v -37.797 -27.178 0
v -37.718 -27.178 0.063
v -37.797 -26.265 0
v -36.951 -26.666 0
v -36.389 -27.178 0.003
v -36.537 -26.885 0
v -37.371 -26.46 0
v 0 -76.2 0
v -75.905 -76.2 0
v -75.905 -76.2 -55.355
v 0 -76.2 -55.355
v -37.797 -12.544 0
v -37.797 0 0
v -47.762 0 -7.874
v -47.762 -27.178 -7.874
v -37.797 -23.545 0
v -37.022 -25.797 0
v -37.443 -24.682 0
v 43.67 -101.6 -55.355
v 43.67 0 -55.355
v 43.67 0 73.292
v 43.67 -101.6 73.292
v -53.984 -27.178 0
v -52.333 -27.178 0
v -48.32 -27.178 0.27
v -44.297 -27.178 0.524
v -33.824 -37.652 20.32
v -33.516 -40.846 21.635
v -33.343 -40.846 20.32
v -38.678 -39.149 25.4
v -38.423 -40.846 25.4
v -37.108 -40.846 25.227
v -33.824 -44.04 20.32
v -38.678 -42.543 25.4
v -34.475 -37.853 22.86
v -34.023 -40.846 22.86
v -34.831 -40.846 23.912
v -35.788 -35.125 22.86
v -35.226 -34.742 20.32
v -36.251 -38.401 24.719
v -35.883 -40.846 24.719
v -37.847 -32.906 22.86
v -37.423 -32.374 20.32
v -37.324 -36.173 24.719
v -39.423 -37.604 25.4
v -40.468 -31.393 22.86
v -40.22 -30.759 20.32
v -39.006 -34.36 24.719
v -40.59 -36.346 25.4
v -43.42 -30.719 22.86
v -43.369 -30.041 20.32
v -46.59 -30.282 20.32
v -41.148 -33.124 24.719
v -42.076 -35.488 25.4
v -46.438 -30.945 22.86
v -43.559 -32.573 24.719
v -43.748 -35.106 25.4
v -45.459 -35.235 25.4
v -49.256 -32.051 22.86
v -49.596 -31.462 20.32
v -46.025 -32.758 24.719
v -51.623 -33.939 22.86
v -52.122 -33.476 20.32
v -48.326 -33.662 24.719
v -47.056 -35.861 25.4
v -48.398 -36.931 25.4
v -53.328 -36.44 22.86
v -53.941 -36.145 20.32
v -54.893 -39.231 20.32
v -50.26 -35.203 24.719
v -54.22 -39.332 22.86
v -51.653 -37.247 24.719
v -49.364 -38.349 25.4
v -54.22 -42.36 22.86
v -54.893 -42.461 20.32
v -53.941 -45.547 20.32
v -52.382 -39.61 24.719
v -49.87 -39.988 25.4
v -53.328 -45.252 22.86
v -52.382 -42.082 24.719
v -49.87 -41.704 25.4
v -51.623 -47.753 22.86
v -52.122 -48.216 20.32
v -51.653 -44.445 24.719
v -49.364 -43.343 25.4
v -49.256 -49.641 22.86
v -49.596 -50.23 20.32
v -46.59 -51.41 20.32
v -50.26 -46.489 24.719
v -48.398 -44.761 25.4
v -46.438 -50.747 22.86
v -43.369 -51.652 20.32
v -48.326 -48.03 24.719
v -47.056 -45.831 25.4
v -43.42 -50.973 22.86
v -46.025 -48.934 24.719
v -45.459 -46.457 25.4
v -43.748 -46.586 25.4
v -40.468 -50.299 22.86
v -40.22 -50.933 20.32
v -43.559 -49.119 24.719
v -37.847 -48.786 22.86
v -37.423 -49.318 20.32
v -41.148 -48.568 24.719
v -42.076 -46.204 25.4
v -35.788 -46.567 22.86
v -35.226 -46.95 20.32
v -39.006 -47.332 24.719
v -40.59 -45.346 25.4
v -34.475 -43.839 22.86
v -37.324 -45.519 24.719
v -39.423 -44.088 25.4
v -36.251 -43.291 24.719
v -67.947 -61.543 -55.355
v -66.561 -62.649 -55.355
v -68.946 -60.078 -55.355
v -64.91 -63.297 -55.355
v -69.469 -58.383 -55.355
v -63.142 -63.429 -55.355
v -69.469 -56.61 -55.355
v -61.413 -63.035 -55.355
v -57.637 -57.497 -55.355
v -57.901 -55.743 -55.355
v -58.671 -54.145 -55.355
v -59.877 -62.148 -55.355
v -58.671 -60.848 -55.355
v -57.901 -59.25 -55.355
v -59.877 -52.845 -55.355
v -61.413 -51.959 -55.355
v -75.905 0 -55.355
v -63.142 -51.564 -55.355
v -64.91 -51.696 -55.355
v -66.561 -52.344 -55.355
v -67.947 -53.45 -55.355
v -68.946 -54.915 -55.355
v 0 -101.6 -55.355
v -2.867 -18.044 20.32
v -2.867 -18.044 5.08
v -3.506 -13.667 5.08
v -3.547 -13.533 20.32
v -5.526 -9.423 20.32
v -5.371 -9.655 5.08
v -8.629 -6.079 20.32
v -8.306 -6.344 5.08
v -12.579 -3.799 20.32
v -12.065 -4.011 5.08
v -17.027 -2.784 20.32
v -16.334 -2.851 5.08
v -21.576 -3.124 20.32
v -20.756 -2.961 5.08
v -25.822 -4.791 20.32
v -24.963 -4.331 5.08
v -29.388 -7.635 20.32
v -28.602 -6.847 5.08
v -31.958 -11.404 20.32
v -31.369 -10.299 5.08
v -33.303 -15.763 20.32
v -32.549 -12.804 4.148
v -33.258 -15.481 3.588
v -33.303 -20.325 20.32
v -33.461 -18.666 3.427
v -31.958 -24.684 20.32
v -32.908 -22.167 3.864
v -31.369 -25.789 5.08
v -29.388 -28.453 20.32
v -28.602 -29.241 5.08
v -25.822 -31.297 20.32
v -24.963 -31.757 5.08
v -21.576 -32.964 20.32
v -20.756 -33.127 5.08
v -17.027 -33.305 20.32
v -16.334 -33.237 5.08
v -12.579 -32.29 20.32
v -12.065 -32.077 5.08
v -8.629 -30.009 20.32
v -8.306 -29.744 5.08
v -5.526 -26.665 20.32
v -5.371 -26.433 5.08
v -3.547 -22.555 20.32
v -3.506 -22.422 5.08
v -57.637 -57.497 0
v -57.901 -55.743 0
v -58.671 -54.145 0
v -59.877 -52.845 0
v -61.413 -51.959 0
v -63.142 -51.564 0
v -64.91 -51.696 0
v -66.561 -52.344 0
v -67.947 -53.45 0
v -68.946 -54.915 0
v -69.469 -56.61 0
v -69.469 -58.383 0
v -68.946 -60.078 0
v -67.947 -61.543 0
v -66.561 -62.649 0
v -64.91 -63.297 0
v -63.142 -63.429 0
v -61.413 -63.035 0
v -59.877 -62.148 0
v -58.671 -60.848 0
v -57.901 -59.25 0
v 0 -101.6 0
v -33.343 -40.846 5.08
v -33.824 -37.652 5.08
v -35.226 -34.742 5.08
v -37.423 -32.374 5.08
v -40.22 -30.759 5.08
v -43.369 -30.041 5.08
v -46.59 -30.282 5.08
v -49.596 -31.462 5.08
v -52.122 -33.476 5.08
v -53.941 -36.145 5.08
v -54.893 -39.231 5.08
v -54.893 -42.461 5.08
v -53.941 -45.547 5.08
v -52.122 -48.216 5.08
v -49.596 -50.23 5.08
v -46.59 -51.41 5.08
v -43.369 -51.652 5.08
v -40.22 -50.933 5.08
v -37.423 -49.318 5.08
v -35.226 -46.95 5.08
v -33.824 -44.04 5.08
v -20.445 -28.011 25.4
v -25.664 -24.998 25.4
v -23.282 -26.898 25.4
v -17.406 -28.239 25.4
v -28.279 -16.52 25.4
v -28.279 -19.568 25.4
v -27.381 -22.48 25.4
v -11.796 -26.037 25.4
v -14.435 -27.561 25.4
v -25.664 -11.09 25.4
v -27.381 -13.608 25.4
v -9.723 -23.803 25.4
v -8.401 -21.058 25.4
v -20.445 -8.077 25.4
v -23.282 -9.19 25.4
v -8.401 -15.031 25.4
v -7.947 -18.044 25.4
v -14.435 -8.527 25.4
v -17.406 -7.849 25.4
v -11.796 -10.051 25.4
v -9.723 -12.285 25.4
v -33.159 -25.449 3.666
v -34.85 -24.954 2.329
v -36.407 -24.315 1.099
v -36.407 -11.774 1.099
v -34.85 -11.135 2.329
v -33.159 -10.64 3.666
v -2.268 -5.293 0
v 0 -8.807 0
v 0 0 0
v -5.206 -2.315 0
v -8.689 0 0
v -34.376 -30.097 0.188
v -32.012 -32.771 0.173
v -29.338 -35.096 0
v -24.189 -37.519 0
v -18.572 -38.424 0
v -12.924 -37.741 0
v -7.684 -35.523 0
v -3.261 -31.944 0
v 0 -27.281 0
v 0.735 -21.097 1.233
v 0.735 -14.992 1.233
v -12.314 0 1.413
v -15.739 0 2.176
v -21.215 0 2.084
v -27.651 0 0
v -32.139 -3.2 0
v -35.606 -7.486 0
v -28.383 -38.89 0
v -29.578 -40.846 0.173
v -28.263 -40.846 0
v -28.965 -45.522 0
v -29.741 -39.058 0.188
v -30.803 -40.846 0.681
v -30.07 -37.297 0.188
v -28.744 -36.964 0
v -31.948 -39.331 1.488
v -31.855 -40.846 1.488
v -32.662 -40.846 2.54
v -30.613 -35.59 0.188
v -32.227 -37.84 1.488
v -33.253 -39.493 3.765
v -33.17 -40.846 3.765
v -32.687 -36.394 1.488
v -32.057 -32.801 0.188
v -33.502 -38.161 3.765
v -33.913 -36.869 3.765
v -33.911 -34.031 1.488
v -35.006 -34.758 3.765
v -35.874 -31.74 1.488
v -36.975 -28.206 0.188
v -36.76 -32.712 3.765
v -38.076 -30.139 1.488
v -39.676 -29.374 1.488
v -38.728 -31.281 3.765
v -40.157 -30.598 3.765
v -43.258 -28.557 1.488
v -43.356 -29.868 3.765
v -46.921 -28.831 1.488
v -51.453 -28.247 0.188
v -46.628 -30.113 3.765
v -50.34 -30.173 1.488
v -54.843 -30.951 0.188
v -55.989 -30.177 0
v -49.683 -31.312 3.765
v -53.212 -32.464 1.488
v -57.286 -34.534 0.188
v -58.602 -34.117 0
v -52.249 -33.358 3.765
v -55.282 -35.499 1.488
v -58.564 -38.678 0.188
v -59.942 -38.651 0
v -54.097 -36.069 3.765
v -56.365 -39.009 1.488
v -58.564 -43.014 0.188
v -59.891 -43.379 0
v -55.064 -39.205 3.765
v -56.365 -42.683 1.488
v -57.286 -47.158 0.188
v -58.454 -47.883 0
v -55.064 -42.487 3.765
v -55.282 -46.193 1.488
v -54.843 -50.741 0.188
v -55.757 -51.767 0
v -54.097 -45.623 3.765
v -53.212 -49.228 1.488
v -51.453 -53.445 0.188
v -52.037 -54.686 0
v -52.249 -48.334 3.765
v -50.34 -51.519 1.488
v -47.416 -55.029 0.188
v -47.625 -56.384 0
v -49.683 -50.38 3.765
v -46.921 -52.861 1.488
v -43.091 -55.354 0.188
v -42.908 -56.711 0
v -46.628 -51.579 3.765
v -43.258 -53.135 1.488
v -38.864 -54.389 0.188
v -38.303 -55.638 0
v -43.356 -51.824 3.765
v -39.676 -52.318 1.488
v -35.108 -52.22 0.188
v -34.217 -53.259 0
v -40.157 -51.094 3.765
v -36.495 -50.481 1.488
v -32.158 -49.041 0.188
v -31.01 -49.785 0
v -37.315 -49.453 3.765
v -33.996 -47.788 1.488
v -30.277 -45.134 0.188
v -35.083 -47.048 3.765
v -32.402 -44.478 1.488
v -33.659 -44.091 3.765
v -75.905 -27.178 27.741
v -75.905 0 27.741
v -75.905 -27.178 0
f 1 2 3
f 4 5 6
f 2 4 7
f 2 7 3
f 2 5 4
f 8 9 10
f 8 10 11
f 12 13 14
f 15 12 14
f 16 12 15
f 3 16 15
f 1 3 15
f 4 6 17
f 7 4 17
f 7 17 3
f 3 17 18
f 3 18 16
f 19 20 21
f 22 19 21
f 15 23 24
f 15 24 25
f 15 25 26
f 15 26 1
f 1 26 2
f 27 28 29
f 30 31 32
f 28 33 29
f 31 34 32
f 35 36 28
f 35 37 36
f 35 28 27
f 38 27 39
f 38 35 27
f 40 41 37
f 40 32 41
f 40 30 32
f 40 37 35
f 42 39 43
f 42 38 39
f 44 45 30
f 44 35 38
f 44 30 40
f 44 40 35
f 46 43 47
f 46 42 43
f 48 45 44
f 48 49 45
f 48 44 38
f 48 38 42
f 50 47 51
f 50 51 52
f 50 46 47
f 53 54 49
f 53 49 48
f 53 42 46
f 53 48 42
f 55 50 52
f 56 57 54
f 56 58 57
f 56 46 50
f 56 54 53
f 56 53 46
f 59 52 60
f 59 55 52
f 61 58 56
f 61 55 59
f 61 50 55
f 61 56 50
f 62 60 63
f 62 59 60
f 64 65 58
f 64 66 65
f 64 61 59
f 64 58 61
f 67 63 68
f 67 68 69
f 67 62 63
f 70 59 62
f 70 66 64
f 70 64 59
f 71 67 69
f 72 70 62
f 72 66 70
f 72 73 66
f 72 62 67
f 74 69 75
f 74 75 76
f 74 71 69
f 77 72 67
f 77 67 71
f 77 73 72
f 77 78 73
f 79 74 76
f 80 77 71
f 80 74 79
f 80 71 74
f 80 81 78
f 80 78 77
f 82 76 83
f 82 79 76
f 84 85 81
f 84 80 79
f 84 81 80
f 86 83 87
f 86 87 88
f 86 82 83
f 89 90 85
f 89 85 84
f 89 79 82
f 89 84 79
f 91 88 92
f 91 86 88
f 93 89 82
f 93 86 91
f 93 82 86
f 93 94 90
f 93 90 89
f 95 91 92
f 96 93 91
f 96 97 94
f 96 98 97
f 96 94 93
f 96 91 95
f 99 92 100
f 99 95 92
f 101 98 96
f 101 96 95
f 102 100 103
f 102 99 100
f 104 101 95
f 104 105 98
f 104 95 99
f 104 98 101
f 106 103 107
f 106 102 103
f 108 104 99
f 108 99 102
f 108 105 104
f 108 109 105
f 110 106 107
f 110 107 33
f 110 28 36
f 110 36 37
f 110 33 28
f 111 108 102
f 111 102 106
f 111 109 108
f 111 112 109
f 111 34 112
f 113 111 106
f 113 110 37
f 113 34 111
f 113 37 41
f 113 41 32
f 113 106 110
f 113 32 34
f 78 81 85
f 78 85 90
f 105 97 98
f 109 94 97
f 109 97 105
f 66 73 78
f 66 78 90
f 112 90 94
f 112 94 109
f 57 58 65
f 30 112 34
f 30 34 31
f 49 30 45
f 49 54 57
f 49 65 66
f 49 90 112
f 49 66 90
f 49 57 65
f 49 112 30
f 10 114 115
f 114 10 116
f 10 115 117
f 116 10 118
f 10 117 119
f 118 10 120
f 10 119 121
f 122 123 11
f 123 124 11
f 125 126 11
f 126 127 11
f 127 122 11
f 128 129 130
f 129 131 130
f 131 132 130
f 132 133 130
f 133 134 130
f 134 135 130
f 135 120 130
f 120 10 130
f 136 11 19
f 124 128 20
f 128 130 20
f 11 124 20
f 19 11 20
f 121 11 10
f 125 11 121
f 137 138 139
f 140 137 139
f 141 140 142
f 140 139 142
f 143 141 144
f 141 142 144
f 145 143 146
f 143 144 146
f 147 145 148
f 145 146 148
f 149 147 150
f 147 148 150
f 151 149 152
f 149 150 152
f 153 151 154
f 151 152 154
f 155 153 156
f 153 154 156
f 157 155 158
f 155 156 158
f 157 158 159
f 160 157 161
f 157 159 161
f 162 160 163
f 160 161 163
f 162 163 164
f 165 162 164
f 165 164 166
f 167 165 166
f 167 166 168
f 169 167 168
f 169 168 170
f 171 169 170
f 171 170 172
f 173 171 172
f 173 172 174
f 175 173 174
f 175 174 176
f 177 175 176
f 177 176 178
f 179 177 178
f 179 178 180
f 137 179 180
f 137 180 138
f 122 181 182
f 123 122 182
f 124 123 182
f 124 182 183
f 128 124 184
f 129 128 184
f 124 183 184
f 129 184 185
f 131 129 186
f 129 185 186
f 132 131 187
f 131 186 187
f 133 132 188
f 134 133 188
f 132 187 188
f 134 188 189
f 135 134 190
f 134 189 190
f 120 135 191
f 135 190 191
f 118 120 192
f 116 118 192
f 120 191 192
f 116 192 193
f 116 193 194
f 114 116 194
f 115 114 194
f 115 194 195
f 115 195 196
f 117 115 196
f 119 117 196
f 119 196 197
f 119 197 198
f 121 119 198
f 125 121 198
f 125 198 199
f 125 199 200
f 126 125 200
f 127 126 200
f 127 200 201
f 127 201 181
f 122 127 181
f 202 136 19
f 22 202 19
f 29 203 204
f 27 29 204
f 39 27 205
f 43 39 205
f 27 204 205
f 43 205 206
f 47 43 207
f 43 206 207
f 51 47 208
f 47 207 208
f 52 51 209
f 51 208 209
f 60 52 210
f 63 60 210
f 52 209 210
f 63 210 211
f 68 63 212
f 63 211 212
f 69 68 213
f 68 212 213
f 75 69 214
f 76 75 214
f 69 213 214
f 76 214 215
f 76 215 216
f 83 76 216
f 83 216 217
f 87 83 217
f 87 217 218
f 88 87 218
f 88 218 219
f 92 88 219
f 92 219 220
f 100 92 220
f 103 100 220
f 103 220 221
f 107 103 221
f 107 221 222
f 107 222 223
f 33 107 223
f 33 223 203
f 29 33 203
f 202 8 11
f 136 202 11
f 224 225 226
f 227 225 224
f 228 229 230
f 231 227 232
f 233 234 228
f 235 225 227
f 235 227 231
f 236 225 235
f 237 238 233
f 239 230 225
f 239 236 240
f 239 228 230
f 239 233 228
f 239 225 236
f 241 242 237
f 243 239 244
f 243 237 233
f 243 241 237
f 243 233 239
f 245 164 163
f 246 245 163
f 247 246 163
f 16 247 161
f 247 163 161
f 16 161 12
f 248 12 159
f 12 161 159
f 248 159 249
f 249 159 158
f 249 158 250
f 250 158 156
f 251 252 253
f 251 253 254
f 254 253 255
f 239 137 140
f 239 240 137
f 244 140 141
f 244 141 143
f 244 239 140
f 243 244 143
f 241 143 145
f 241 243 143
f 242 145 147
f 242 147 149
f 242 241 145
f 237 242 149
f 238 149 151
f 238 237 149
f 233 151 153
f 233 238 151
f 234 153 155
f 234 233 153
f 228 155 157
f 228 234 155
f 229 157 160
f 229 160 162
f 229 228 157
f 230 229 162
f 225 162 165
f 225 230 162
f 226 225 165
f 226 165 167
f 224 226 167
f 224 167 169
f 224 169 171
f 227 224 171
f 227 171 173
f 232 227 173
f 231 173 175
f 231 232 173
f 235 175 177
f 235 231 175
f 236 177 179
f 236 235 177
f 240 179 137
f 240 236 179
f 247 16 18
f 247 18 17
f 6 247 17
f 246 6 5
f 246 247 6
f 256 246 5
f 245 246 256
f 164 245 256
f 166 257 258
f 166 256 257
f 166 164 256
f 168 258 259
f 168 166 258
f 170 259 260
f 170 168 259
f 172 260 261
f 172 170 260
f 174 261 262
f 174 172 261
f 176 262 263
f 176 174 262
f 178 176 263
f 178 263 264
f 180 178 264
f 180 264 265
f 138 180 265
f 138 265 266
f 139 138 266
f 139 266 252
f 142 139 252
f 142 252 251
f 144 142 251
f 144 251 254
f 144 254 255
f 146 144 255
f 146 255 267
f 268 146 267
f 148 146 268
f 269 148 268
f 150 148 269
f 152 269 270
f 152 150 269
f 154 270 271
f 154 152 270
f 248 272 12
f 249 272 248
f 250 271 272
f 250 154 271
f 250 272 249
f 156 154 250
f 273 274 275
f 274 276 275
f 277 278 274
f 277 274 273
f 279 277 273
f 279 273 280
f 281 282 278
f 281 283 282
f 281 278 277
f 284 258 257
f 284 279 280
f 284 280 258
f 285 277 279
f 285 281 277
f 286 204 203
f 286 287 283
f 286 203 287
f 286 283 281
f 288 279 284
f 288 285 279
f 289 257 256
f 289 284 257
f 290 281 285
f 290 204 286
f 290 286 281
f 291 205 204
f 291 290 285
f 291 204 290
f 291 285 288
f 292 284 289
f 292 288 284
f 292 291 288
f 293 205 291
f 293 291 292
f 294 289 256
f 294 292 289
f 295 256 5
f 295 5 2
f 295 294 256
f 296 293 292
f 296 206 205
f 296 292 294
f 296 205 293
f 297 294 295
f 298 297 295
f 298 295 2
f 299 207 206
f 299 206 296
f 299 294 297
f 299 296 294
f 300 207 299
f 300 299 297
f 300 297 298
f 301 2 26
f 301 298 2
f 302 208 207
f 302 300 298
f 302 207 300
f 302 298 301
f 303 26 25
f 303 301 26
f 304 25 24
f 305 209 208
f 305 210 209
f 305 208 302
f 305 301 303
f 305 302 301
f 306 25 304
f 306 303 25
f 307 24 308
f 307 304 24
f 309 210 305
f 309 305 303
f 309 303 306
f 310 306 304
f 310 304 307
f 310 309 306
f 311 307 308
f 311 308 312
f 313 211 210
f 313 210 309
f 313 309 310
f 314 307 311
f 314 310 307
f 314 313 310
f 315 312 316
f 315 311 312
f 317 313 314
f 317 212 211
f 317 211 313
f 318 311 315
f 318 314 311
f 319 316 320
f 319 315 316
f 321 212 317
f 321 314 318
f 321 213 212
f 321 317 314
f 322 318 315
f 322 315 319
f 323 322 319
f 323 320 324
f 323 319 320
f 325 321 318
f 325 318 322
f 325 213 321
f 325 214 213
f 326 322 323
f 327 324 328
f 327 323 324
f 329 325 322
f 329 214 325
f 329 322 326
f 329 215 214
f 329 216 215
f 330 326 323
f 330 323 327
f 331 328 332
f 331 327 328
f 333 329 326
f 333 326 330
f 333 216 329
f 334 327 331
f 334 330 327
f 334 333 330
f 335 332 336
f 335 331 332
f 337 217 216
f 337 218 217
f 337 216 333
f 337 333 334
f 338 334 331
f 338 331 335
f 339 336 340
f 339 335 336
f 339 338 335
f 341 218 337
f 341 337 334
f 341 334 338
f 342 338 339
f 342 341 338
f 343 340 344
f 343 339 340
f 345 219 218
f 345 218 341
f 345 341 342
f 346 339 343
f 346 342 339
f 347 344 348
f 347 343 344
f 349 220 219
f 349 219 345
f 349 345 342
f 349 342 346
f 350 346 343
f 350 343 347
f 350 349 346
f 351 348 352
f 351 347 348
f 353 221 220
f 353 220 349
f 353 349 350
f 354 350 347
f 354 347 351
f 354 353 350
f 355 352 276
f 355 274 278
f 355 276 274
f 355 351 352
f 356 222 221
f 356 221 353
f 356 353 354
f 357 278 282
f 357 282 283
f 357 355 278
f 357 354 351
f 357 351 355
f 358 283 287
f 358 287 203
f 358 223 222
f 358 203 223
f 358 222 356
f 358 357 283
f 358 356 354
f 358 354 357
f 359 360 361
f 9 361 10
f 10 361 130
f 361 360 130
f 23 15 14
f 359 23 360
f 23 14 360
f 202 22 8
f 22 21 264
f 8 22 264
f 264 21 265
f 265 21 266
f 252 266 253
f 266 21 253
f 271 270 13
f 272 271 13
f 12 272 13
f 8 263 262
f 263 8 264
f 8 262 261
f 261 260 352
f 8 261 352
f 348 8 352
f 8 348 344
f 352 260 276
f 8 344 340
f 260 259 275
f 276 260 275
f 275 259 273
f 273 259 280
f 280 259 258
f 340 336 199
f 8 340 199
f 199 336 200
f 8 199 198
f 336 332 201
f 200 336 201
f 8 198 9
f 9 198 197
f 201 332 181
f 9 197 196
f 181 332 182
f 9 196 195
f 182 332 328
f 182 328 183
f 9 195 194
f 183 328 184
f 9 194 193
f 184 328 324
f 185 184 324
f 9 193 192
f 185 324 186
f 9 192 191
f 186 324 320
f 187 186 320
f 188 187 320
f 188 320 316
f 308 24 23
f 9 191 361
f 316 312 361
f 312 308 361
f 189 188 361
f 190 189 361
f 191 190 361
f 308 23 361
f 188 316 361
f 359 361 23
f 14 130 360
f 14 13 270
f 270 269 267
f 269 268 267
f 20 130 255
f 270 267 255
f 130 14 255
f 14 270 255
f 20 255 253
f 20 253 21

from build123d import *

# Parameters (mm, degrees)
F1_DEPTH = 76.2
F3_DEPTH = 25.4
F5_DEPTH = 49.022
F6_R     = 15.3034000689
F6_R_2   = 10.835787307
F6_R_3   = 5.9493654503
F7_DEPTH = 25.4
F8_DEPTH = 12.7
F9_DEPTH = 120.396


# Not quite as in the source:
# - a fillet or chamfer that OpenCascade refuses, or shapes differently, is made with other operations: its cross-section is extruded or revolved along the edge and cut away or added


with BuildPart() as f1:
    # F0 (on Front) → F1 (new body)
    with BuildSketch(Plane.XZ):
        Polygon((43.6695814133, 73.2915997505), (0, 0), (-37.7974100411, 0), (-75.9054422379, 48.224221915), (-75.9054422379, -55.3548447788), (43.6695814133, -55.3548447788), align=None)
    extrude(amount=F1_DEPTH)

    # F2 (on face) → F3 (join)
    with BuildSketch(Plane.XZ.offset(76.2)):
        Polygon((43.6695814133, 73.2915997505), (0, 0), (0, -55.3548447788), (43.6695814133, -55.3548447788), align=None)
    extrude(amount=F3_DEPTH)

    # F4 (on face) → F5 (cut)
    with BuildSketch(Plane.XZ.offset(76.2)):
        Polygon((-75.9054422379, 0), (-37.7974100411, 0), (-75.9054422379, 48.224221915), align=None)
    extrude(amount=-F5_DEPTH, mode=Mode.SUBTRACT)

    # F6 (on face) → F7 (join)
    with BuildSketch(Plane.XY):
        with Locations((-18.1702096015, -18.0441774428)):
            Circle(F6_R)
        with Locations((-44.1785492003, -40.8460125327)):
            Circle(F6_R_2)
        with Locations((-63.5862797499, -57.4966222048)):
            Circle(F6_R_3)
    extrude(amount=F7_DEPTH)

    # F8 (cut): a face of the model
    f8_faces = [f1.faces().sort_by_distance(p)[0] for p in [
        (-56.8514261395, -13.589, 24.1121109575),
    ]]
    extrude(f8_faces, amount=-F8_DEPTH, mode=Mode.SUBTRACT)

    # F9 (cut): a face of the model
    f9_faces = [f1.faces().sort_by_distance(p)[0] for p in [
        (-63.5862797499, -57.4966222048, 25.4),
    ]]
    extrude(f9_faces, amount=-F9_DEPTH, mode=Mode.SUBTRACT)

    # F10: fillet of radius 5.08 on 3 edges, made by hand

    # F10_s1 → F10_t2 (revolve, cut)
    with BuildSketch(Plane.XZ.offset(40.8460125327)):
        with BuildLine():
            ThreePointArc((-33.3427618933, 20.32), (-34.8306594448, 23.9121024484), (-38.4227618933, 25.4))
            Line((-38.4227618933, 25.4), (-33.3427618933, 25.4))
            Line((-33.3427618933, 25.4), (-33.3427618933, 20.32))
        make_face()
    revolve(axis=Axis((-44.1785492003, -40.8460125327, 25.4), (0, 0, 1)), mode=Mode.SUBTRACT)


with BuildPart() as f10_tool4:
    # F10_s5 → F10_t6 (revolve)
    with BuildSketch(Plane.XZ.offset(40.8460125327)):
        with BuildLine():
            ThreePointArc((-28.2627618933, 0), (-31.8548643417, 1.4878975516), (-33.3427618933, 5.08))
            Line((-33.3427618933, 5.08), (-33.3427618933, 0))
            Line((-33.3427618933, 0), (-28.2627618933, 0))
        make_face()
    revolve(axis=Axis((-44.1785492003, -40.8460125327, 0), (0, 0, 1)))

    split(bisect_by=Plane.XZ.offset(27.178), keep=Keep.TOP)


with BuildPart() as f1_1:
    add(f1.part)

    # F10_t3: union F10_tool4
    add(f10_tool4.part)


with BuildPart() as f10_tool9:
    # F10_s10 → F10_t11 (revolve)
    with BuildSketch(Plane.XZ.offset(40.8460125327)):
        with BuildLine():
            ThreePointArc((-28.2627618933, 0), (-31.8548643417, 1.4878975516), (-33.3427618933, 5.08))
            Line((-33.3427618933, 5.08), (-33.3427618933, 0))
            Line((-33.3427618933, 0), (-28.2627618933, 0))
        make_face()
    revolve(axis=Axis((-44.1785492003, -40.8460125327, 0), (0, 0, 1)))

    split(bisect_by=Plane(origin=(-14.5296914395, 0, 18.3867553359), x_dir=(0, 1, 0), z_dir=(0.6200078307, 0, -0.7845956218)), keep=Keep.TOP)


with BuildPart() as f1_2:
    add(f1_1.part)

    # F10_t8: union F10_tool9
    add(f10_tool9.part)

    # F11: chamfer of 5.08 on 3 edges, made by hand


with BuildPart() as f11_tool2:
    # F11_s3 → F11_t4 (revolve)
    with BuildSketch(Plane.XZ.offset(18.0441774428)):
        Polygon((2.2131904673, 0), (-2.8668095327, 5.08), (-2.8668095327, 0), align=None)
    revolve(axis=Axis((-18.1702096015, -18.0441774428, 0), (0, 0, 1)))

    split(bisect_by=Plane.XZ, keep=Keep.TOP)

    split(bisect_by=Plane(origin=(-14.5296914395, 0, 18.3867553359), x_dir=(0, 1, 0), z_dir=(0.6200078307, 0, -0.7845956218)), keep=Keep.TOP)


with BuildPart() as f1_3:
    add(f1_2.part)

    # F11_t1: union F11_tool2
    add(f11_tool2.part)

    # F11_s7 → F11_t8 (revolve, cut)
    with BuildSketch(Plane.XZ.offset(18.0441774428)):
        Polygon((-2.8668095327, 20.32), (-7.9468095327, 25.4), (-2.8668095327, 25.4), align=None)
    revolve(axis=Axis((-18.1702096015, -18.0441774428, 25.4), (0, 0, 1)), mode=Mode.SUBTRACT)


solid = f1_3.part
